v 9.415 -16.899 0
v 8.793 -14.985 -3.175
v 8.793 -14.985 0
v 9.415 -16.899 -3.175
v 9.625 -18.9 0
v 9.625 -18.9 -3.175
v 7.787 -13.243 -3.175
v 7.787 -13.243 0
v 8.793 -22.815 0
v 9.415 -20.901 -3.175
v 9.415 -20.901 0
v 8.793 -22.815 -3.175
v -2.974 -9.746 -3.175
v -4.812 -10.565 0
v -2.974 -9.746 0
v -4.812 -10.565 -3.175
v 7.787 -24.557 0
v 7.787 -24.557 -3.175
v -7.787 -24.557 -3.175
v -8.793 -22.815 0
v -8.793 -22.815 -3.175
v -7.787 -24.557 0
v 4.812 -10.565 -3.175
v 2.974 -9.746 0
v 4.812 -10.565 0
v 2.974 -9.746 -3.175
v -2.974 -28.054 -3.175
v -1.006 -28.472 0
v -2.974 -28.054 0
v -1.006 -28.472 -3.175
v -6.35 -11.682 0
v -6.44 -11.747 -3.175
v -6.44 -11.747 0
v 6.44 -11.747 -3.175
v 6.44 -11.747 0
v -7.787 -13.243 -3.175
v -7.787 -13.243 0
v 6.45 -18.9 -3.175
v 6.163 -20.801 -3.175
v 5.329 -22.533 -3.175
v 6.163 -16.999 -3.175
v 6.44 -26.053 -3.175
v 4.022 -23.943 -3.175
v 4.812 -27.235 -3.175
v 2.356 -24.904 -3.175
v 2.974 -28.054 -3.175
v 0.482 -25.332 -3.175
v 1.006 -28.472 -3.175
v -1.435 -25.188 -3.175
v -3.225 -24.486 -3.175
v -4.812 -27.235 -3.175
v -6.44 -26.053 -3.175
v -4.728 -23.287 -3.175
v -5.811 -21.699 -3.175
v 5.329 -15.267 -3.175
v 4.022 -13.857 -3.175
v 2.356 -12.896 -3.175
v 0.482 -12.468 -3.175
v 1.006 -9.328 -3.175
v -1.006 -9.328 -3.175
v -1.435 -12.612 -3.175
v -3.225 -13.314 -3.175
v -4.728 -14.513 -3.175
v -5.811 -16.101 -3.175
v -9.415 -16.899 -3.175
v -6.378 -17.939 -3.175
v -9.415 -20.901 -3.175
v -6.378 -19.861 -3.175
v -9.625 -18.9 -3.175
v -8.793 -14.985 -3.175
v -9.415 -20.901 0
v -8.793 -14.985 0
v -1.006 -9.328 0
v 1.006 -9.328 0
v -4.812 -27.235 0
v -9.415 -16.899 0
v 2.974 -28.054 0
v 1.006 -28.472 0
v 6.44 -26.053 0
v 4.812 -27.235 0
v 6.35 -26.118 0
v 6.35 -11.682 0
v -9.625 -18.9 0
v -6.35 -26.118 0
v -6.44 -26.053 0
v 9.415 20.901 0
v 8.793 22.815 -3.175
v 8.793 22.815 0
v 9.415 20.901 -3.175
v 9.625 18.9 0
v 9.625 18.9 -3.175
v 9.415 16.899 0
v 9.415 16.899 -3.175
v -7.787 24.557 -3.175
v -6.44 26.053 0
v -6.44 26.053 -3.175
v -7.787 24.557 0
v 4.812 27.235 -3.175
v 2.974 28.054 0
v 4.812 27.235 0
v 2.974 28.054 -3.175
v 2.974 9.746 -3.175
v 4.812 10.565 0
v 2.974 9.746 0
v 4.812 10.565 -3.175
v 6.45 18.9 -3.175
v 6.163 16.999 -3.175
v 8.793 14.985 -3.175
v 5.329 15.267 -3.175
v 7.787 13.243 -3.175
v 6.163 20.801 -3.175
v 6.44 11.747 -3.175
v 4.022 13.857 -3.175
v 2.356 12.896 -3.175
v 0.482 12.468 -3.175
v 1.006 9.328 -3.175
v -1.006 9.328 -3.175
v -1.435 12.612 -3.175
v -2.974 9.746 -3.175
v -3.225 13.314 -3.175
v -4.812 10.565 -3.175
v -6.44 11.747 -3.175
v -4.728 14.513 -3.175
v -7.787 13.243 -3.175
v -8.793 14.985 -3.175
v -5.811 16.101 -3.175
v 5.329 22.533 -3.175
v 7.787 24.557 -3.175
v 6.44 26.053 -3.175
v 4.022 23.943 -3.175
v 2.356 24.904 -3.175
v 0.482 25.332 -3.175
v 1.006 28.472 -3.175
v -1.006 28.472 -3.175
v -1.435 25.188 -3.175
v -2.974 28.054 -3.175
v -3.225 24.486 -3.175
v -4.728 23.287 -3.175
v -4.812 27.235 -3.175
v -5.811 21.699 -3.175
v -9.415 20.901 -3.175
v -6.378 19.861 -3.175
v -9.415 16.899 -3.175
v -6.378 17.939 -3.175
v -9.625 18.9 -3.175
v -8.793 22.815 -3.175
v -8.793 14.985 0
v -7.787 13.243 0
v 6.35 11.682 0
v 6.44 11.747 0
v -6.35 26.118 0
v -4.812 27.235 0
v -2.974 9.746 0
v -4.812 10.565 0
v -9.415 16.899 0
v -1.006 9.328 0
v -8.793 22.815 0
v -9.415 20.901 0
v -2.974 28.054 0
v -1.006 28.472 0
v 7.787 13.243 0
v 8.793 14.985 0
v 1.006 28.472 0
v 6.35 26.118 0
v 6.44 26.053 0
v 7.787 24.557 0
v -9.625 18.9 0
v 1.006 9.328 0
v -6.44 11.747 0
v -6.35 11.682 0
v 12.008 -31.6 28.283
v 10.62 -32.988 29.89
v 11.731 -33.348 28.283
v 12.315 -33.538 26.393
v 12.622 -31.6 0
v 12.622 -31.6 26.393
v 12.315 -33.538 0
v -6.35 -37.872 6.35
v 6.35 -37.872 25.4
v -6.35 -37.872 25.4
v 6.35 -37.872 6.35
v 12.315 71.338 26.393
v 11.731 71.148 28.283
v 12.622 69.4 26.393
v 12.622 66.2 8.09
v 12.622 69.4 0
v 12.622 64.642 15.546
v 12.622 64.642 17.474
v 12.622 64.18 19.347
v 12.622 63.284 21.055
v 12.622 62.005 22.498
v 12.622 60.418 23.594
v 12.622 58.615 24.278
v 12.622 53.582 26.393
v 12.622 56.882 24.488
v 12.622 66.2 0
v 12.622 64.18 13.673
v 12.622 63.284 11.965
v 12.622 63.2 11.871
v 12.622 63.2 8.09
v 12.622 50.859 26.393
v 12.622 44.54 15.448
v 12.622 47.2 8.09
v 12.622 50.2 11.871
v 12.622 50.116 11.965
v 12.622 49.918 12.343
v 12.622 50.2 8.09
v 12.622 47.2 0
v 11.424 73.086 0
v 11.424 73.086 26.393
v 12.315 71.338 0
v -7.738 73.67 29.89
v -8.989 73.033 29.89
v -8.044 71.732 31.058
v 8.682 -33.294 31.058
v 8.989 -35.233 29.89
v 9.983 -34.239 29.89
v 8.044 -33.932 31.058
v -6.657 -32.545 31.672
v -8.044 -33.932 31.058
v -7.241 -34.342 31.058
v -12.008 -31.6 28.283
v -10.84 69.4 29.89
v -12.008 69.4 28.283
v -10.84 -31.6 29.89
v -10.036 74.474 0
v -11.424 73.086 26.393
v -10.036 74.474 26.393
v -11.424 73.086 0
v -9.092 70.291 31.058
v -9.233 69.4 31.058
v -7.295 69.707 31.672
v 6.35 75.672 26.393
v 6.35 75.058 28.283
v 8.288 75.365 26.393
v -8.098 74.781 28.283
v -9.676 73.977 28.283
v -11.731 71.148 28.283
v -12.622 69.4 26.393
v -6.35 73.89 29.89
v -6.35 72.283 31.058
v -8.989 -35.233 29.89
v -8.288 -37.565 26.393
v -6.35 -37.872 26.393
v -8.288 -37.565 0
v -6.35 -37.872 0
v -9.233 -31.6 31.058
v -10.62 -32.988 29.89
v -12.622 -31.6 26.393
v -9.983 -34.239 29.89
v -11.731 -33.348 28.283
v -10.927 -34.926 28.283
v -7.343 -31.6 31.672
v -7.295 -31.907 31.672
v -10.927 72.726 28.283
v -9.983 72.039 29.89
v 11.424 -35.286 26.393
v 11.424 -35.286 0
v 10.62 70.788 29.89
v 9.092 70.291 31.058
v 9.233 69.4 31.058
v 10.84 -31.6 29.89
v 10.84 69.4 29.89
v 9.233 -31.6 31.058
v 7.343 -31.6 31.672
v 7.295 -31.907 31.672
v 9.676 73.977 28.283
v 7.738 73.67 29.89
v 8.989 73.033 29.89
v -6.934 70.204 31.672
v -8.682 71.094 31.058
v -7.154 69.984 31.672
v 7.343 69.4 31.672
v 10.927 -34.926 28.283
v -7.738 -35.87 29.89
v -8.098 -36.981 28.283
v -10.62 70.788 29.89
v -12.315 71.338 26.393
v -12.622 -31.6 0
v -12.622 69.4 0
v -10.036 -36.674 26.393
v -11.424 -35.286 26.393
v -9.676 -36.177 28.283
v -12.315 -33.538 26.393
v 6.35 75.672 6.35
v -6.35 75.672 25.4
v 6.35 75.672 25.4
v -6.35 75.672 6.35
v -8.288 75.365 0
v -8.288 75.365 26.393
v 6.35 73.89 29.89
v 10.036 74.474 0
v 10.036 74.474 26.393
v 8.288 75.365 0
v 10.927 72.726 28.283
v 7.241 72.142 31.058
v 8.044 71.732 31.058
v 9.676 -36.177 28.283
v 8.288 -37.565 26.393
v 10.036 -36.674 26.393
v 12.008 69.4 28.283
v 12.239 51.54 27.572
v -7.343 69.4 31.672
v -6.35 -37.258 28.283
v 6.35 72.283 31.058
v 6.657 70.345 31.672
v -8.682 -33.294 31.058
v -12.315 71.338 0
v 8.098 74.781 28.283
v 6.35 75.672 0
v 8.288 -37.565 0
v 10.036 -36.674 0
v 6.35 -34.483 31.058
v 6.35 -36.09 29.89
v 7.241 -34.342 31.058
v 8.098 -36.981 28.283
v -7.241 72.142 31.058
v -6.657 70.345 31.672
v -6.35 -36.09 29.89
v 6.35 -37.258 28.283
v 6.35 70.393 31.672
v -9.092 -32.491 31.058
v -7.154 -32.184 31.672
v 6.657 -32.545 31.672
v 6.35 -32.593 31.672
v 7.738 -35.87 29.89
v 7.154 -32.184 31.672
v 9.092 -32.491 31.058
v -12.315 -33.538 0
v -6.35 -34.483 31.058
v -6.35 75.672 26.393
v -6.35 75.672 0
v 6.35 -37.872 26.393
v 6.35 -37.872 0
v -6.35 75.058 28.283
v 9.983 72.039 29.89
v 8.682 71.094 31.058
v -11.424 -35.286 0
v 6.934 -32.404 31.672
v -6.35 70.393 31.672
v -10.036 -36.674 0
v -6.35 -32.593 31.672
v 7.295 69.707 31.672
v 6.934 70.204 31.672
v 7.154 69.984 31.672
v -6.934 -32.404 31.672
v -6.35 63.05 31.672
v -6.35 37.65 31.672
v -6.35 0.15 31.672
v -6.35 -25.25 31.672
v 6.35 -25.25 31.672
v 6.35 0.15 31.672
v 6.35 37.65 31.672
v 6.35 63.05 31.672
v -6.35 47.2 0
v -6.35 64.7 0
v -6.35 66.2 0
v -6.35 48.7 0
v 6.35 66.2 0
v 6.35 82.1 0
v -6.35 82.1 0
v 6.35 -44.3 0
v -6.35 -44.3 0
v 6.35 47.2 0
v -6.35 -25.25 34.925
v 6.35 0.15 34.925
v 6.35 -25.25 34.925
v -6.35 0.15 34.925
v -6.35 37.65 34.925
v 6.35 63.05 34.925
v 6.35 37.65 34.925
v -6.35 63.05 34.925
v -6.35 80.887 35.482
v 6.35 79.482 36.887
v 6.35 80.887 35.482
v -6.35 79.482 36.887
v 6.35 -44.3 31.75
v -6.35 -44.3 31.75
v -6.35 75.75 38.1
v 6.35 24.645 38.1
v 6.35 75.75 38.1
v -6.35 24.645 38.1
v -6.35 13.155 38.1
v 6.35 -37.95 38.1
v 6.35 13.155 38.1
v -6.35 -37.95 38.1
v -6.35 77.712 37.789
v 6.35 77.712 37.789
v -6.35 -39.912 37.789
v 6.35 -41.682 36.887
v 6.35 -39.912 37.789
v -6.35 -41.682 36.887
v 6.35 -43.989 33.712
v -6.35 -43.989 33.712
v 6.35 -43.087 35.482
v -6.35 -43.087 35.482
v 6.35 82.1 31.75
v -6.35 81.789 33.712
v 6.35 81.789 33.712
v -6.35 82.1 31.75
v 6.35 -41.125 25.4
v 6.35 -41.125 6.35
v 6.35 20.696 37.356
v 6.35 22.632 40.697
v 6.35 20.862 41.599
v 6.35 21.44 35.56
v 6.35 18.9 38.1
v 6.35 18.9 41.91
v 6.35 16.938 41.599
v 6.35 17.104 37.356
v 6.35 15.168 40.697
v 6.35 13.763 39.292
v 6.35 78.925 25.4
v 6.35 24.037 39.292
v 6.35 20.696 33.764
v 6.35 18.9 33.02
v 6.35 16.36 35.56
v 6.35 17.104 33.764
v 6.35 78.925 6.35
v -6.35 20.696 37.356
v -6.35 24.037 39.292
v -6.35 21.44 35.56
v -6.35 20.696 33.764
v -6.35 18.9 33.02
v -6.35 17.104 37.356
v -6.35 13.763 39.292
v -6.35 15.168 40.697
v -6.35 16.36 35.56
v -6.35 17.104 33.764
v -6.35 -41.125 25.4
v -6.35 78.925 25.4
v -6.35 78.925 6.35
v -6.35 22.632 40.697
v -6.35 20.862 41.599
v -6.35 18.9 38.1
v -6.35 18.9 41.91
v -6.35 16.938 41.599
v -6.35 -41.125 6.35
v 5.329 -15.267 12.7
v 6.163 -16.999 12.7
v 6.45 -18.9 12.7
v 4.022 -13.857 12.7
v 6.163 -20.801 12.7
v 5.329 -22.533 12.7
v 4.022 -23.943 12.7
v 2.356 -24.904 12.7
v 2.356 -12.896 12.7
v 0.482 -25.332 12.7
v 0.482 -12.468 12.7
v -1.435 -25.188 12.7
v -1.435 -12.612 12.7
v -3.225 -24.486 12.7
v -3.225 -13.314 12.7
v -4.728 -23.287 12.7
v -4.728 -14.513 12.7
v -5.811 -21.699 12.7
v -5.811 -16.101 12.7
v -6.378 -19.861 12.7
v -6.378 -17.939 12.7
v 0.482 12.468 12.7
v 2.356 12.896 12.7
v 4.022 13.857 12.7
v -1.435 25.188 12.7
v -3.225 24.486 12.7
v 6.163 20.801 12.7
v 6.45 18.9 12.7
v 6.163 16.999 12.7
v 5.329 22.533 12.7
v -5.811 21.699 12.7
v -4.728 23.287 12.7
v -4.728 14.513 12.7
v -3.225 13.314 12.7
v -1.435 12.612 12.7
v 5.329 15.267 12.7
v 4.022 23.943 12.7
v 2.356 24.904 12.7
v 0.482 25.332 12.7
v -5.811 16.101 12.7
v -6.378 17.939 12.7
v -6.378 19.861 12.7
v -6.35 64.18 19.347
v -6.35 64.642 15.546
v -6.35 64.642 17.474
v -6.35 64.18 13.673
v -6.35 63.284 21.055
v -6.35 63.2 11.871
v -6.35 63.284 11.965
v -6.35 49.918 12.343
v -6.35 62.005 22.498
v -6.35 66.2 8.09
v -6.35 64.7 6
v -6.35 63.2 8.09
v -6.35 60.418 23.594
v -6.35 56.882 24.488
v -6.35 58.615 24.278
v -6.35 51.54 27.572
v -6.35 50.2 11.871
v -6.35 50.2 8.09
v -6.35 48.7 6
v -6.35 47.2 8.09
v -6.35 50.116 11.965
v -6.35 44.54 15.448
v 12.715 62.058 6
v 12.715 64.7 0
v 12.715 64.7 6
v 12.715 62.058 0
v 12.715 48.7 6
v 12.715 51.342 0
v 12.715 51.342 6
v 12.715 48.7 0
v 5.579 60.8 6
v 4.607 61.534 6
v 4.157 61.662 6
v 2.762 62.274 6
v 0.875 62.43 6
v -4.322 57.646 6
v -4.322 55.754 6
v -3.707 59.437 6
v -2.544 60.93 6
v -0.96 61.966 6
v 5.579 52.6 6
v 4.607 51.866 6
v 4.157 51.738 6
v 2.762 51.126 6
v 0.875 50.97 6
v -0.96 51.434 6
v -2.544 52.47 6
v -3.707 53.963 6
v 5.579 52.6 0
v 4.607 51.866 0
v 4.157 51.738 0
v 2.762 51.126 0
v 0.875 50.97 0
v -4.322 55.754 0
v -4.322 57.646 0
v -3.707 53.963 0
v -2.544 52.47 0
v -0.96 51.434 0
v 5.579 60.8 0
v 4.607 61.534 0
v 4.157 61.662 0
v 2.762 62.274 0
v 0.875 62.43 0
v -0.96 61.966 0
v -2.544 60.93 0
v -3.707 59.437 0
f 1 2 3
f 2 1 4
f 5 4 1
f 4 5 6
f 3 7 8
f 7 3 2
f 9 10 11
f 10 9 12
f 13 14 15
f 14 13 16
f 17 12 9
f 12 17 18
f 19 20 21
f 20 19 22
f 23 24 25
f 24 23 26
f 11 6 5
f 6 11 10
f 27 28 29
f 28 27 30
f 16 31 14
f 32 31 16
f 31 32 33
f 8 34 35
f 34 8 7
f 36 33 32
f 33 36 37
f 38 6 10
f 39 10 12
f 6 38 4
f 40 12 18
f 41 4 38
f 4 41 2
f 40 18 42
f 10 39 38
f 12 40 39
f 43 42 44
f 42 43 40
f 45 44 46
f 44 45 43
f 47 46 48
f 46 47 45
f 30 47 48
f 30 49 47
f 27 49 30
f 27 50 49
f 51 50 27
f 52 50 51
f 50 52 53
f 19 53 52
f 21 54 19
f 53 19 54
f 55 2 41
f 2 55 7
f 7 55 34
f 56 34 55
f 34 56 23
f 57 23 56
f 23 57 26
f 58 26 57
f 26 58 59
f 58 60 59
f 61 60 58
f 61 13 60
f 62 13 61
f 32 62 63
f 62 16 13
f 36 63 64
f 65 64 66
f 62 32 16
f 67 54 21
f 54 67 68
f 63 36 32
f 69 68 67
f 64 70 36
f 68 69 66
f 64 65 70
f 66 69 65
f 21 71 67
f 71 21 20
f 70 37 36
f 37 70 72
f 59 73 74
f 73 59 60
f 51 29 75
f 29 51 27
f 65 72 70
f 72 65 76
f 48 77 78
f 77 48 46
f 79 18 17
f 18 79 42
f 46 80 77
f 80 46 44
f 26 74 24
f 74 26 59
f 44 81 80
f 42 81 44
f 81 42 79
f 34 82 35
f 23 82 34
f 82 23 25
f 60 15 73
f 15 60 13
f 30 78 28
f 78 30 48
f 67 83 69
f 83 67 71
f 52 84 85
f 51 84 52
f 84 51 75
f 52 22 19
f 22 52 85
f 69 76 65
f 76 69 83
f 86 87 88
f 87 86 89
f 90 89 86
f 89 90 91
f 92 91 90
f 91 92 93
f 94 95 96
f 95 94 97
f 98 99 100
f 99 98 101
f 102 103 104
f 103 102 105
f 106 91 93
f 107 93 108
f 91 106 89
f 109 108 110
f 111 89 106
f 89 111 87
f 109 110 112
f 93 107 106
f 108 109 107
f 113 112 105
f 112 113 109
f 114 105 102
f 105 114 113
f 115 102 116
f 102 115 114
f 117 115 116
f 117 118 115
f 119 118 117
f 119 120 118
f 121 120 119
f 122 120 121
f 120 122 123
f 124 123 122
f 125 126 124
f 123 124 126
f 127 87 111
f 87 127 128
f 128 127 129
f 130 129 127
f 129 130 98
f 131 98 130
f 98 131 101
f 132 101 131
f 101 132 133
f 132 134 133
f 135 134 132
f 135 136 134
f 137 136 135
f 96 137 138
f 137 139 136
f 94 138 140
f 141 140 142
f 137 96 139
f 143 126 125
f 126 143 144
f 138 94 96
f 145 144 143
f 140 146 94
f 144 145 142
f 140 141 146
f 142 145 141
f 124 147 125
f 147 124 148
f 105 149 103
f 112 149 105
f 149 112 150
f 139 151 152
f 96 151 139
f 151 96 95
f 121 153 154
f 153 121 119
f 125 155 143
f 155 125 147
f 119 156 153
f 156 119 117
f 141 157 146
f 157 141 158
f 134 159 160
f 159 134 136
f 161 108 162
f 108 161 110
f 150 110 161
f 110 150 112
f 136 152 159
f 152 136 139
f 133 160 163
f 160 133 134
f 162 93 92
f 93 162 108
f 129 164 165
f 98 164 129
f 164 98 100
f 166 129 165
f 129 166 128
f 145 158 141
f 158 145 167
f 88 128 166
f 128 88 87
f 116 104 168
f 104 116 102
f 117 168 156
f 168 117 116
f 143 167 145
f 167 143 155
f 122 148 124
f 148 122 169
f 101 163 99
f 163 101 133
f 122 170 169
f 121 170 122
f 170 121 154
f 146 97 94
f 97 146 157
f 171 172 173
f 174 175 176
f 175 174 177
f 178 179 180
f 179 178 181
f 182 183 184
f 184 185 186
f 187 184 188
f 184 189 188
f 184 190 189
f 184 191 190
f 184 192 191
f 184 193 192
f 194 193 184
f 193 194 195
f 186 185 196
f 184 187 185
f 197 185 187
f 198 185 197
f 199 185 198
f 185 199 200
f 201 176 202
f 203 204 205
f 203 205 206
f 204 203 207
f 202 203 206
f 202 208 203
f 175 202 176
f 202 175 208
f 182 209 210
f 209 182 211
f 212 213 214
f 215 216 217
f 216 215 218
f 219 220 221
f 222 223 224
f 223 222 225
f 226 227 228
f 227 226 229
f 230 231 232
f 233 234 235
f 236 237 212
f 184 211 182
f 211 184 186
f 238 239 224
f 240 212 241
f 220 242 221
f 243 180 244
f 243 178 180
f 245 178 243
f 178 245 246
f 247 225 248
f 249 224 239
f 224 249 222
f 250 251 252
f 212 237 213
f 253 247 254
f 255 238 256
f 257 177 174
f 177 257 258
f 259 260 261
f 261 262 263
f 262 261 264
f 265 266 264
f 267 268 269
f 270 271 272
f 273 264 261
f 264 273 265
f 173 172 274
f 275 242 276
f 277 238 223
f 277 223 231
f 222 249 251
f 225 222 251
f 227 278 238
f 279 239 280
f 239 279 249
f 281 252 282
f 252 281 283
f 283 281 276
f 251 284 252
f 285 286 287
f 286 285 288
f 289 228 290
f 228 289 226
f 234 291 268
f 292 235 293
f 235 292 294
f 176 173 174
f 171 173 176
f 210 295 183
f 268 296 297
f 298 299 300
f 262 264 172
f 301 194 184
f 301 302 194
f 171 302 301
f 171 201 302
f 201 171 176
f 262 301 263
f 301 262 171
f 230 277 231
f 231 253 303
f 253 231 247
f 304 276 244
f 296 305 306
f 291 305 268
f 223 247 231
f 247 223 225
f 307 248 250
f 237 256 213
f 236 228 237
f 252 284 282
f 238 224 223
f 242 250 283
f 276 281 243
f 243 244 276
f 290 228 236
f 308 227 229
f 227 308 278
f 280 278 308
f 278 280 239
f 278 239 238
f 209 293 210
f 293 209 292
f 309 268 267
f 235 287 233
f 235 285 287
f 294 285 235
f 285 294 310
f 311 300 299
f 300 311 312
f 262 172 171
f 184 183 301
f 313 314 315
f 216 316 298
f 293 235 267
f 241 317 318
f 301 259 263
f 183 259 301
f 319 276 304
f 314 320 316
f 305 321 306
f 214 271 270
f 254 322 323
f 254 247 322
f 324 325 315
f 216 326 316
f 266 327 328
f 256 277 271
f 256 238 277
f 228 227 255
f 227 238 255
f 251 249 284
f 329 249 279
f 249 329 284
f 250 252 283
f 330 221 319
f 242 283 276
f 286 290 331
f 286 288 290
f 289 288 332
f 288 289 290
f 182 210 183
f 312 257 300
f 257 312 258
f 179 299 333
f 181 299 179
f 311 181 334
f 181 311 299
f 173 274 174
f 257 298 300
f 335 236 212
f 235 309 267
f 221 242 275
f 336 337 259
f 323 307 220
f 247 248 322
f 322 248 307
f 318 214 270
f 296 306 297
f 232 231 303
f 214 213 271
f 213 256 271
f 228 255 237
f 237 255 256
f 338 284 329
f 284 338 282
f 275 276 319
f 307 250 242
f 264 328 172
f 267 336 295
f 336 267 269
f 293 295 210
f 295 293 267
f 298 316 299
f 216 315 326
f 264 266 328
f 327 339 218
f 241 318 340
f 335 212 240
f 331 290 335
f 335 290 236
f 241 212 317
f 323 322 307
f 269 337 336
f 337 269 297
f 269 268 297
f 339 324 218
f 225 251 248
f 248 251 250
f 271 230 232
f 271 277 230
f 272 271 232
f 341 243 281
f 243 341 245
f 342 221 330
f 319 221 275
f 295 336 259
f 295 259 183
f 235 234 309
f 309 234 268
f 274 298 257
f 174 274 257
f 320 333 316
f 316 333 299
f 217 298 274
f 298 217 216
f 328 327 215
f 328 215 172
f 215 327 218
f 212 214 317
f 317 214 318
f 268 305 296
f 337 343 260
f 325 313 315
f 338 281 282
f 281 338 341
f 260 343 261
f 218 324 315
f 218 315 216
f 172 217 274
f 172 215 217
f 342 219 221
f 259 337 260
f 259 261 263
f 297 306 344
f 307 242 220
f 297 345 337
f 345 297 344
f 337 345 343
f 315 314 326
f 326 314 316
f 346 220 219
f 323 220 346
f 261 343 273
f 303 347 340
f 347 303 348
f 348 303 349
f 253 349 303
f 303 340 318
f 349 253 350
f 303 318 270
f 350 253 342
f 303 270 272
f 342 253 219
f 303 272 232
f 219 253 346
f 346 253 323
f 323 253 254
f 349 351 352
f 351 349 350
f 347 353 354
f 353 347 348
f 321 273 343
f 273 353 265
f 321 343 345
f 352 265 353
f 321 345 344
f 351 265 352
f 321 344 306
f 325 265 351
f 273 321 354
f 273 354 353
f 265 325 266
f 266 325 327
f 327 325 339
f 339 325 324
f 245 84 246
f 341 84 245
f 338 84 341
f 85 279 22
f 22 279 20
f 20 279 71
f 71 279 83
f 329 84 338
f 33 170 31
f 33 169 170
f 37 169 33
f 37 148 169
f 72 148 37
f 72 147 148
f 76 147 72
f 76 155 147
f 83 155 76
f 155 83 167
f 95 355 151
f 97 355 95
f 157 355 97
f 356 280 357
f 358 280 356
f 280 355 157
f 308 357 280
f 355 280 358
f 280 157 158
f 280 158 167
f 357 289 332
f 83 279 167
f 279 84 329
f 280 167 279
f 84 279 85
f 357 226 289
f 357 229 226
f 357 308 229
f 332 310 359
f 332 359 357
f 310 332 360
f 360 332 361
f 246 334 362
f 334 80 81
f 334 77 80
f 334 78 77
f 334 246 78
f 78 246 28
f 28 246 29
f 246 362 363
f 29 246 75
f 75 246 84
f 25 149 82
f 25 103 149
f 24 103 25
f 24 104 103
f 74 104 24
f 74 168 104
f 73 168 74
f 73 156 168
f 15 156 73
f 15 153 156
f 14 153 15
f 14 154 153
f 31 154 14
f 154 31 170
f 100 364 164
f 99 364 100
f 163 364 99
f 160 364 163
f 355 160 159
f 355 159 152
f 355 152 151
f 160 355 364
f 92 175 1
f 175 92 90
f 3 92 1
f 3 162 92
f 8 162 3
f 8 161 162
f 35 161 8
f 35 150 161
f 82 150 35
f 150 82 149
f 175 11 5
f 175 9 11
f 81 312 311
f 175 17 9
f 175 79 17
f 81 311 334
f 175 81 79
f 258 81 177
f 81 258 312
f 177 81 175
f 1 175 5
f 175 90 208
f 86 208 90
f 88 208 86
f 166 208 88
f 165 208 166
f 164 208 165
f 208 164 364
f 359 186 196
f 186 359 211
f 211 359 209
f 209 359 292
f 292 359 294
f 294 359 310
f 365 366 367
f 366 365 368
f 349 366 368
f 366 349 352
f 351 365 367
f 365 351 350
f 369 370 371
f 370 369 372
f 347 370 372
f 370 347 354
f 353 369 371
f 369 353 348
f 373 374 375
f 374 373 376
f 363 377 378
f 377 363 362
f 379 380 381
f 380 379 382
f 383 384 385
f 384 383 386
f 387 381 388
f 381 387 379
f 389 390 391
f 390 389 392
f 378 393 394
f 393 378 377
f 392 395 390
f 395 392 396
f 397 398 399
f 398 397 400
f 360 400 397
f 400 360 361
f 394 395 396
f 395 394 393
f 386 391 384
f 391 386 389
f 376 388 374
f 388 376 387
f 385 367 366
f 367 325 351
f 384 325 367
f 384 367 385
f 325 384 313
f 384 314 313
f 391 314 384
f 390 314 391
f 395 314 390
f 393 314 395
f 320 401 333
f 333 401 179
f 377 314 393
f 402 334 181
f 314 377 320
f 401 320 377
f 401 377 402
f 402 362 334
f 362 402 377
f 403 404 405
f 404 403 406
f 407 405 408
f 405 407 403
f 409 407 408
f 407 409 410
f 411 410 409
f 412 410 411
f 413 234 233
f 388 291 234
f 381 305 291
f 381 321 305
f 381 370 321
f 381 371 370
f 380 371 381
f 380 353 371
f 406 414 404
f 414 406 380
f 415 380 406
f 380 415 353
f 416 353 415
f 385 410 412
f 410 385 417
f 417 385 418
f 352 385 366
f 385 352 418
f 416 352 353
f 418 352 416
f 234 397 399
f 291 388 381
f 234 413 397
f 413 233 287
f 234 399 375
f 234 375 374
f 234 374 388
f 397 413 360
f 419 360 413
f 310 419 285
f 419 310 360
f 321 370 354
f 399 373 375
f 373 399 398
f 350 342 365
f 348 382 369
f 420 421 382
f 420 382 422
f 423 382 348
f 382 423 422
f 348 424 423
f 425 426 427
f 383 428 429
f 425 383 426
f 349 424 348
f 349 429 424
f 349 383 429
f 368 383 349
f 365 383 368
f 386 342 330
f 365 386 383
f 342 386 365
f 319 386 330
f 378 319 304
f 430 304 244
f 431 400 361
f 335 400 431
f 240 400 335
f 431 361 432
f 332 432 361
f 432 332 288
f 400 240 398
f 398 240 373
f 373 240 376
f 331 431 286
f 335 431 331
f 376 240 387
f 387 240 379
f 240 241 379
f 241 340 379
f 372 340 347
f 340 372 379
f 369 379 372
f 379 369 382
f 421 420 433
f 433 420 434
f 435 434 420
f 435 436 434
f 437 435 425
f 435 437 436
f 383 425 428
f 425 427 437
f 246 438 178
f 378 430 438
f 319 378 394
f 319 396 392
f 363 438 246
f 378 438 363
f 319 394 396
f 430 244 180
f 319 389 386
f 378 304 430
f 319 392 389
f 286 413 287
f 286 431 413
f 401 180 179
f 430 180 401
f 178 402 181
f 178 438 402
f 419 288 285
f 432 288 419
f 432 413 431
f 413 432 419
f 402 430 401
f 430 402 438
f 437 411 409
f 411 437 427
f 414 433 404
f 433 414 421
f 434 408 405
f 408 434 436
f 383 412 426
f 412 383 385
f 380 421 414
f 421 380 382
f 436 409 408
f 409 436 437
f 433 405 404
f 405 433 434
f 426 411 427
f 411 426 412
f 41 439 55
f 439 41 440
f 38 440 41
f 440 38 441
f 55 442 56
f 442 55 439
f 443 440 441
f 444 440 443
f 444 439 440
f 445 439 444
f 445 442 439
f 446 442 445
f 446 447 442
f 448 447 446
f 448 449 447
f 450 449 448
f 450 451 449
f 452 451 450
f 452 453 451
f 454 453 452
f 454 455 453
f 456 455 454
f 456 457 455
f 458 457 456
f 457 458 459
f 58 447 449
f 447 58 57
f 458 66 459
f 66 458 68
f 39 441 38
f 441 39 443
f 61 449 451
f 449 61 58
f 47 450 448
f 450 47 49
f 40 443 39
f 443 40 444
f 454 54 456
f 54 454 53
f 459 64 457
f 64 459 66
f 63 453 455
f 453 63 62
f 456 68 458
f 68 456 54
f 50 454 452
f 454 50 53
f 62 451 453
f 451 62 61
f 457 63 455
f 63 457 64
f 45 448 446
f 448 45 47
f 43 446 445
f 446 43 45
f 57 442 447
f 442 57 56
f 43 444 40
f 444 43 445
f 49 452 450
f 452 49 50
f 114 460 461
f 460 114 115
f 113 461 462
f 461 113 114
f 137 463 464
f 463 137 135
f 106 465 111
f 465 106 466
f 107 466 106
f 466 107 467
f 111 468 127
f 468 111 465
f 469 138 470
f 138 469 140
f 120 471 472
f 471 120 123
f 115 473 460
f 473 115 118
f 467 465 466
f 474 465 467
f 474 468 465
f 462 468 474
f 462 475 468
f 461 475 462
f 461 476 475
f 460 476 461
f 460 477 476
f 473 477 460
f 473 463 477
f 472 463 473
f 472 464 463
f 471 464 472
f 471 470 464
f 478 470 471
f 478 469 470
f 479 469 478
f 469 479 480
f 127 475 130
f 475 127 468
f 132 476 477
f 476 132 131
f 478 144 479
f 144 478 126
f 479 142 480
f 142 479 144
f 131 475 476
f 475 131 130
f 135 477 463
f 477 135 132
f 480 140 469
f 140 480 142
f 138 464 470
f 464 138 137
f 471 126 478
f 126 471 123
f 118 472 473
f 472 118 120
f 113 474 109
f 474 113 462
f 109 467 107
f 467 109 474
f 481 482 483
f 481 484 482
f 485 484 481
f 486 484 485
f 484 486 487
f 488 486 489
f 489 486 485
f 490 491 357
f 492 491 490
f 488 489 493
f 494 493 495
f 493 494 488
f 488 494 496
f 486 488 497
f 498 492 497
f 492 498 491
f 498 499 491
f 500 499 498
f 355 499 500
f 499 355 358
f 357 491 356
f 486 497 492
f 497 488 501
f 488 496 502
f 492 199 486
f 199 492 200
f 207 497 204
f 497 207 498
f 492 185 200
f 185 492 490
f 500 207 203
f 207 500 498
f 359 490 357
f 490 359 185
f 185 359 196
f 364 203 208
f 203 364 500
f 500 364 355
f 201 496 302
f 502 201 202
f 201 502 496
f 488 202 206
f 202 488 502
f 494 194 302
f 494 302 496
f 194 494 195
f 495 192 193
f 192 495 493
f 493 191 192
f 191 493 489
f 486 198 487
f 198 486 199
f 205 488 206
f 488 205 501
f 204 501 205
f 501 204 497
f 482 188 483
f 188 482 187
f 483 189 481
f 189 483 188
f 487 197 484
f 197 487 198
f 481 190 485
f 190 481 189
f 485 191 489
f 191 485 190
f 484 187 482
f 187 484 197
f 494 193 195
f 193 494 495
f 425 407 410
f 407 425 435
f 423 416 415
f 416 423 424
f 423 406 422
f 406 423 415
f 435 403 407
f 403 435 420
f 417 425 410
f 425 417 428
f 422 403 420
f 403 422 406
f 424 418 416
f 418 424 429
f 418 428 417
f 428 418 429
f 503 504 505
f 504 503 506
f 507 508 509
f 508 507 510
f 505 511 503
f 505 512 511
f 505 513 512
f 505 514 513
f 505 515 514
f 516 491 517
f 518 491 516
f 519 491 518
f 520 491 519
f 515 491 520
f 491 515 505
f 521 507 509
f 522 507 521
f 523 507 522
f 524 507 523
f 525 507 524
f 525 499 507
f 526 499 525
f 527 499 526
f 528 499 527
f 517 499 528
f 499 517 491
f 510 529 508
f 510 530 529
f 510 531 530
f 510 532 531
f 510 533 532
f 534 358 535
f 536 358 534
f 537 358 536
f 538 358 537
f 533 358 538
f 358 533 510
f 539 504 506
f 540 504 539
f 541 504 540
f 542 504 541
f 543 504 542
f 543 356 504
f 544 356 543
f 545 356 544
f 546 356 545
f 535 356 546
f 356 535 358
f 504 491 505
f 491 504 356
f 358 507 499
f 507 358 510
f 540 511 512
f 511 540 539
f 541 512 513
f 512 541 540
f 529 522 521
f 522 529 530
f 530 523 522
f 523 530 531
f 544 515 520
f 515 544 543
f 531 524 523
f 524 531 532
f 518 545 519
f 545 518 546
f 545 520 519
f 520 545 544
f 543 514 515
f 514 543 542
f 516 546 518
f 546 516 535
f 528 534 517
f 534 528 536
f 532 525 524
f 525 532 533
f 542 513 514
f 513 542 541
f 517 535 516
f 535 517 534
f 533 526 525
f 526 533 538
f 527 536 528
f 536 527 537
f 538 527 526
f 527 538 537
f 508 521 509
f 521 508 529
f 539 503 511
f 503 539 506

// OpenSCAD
//air compressor tool caddy
//designed by: Andrew Herren
//modified: 7/22/13

// preview[view:east, tilt:bottom diagonal]
tools=2; //[1:10]
spacing=25.2*1.5;
center_hanger=1; //[1:On,0:Off]
pressure_guage=1; //[1:On,0:Off]



difference(){
union(){
if(center_hanger==1 || tools==1){
translate([-25.4/4,pressure_guage*spacing/2,25.4*1.4])rotate([0,90,0])cylinder(25.4/2,25.4/4,25.4/4);
}
for(i=[0:tools-1]){
translate([0,((-25.4*2-(tools-1)*spacing)/2)+25.4+(i*spacing),-25.4/8])cylinder(25.4,6.45+(25.4/8),6.45+(25.4/8));
}
difference(){
translate([25.4/4,(((tools-1)*spacing)+(25.4*1.25))/2,0])minkowski(){
translate([-25.4/4,(-(25.4*.75)-(tools-1)*spacing)/2,0])sphere(25.4/4);
translate([-25.4/4,(-25.4*1.5-(tools-1)*spacing)/2,0])cube([25.4/2,((tools-1)*spacing)+25.4+(pressure_guage*spacing),25.4]);
}
translate([-25.4,-(tools*spacing+(2*25.4))/2,-20])cube([25.4*2,tools*spacing+(2*25.4)+(pressure_guage*spacing),20]);
}
difference(){
hull(){
translate([-25.4/4,-(((tools-1)*spacing)+(25.4*2))/2,0])cube([25.4/2,((tools-1)*spacing)+(25.4*2)+(pressure_guage*spacing),25.4]);
translate([-25.4/4,-(((tools-1)*spacing)+25.4*1.5)/2,25.4*1.25])rotate([0,90,0])cylinder(25.4/2,25.4/4,25.4/4);
translate([-25.4/4,(((tools-1)*spacing)+25.4*1.5)/2+(pressure_guage*spacing),25.4*1.25])rotate([0,90,0])cylinder(25.4/2,25.4/4,25.4/4);
}
translate([-25.4/2,-(((tools-1)*spacing)+(25.4*1.75))/2,25.4/4])cube([25.4,((tools-1)*spacing)+(25.4*1.75)+(pressure_guage*spacing),25.4*.75]);
if(tools>1){
translate([-25.4/2,((-25.4/2)-(tools-1)*spacing)/2,25.4*(5/8)])cube([25.4,25.4,25.4*.75]);
translate([-25.4/2,((-25.4*1.5)+(tools-1)*spacing)/2+(pressure_guage*spacing),25.4*(5/8)])cube([25.4,25.4,25.4*.75]);
}
}
}
if(center_hanger==1 || tools==1){
translate([-25.4/2,(pressure_guage*spacing)/2,25.4*1.4])rotate([0,90,0])cylinder(25.4,25.4/10,25.4/10);
}
for(i=[0:tools-1]){
translate([0,((-25.4*2-(tools-1)*spacing)/2)+25.4+(i*spacing),-25.4/2])cylinder(25.4,6.45,6.45);
}
if(pressure_guage==1){
translate([-25.4*.25,((-25.4*2-(tools-1)*spacing)/2)+25.4+(tools*spacing)-6.5,-25.4*1.45])cube([25.42,13,50]);
translate([-25.4*.25,((-25.4*2-(tools-1)*spacing)/2)+25.4+(tools*spacing)-9.5,-25.4*1.65])cube([25.42,19,50]);
translate([-25.4*.25,((-25.4*2-(tools-1)*spacing)/2)+25.4+(tools*spacing),25.4*.65])rotate([60,0,0])translate([0,-7,0])cube([25.4,14,10]);
translate([-25.4*.25,((-25.4*2-(tools-1)*spacing)/2)+25.4+(tools*spacing),25.4*.65])rotate([0,90,0])cylinder(25.42,8,8);
}
}

if(pressure_guage==1){
difference(){
translate([-25.4*.25,((-25.4*2-(tools-1)*spacing)/2)+25.4+(tools*spacing)-8,0])cube([25.42*.75,16,6]);
translate([(25.4*.25)-4.15,((-25.4*2-(tools-1)*spacing)/2)+25.4+(tools*spacing),-2])cylinder(10,5.4,5.4);
translate([(25.4*.25)-5,((-25.4*2-(tools-1)*spacing)/2)+25.4+(tools*spacing),-2])cylinder(10,5.75,5.75);
translate([(25.4*.25)-4.85,((-25.4*2-(tools-1)*spacing)/2)+25.4+(tools*spacing)-3,-2])cube([25.42*.5,6,10]);
translate([(25.4*.5)-4.85,((-25.4*2-(tools-1)*spacing)/2)+25.4+(tools*spacing)-4.5,-2])rotate([0,0,-10])translate([-25.4*.25,0,0])cube([25.42*.5,4,10]);
translate([(25.4*.5)-4.85,((-25.4*2-(tools-1)*spacing)/2)+25.4+(tools*spacing)+4.5,-2])rotate([0,0,10])translate([-25.4*.25,-4,0])cube([25.42*.5,4,10]);
}
}



